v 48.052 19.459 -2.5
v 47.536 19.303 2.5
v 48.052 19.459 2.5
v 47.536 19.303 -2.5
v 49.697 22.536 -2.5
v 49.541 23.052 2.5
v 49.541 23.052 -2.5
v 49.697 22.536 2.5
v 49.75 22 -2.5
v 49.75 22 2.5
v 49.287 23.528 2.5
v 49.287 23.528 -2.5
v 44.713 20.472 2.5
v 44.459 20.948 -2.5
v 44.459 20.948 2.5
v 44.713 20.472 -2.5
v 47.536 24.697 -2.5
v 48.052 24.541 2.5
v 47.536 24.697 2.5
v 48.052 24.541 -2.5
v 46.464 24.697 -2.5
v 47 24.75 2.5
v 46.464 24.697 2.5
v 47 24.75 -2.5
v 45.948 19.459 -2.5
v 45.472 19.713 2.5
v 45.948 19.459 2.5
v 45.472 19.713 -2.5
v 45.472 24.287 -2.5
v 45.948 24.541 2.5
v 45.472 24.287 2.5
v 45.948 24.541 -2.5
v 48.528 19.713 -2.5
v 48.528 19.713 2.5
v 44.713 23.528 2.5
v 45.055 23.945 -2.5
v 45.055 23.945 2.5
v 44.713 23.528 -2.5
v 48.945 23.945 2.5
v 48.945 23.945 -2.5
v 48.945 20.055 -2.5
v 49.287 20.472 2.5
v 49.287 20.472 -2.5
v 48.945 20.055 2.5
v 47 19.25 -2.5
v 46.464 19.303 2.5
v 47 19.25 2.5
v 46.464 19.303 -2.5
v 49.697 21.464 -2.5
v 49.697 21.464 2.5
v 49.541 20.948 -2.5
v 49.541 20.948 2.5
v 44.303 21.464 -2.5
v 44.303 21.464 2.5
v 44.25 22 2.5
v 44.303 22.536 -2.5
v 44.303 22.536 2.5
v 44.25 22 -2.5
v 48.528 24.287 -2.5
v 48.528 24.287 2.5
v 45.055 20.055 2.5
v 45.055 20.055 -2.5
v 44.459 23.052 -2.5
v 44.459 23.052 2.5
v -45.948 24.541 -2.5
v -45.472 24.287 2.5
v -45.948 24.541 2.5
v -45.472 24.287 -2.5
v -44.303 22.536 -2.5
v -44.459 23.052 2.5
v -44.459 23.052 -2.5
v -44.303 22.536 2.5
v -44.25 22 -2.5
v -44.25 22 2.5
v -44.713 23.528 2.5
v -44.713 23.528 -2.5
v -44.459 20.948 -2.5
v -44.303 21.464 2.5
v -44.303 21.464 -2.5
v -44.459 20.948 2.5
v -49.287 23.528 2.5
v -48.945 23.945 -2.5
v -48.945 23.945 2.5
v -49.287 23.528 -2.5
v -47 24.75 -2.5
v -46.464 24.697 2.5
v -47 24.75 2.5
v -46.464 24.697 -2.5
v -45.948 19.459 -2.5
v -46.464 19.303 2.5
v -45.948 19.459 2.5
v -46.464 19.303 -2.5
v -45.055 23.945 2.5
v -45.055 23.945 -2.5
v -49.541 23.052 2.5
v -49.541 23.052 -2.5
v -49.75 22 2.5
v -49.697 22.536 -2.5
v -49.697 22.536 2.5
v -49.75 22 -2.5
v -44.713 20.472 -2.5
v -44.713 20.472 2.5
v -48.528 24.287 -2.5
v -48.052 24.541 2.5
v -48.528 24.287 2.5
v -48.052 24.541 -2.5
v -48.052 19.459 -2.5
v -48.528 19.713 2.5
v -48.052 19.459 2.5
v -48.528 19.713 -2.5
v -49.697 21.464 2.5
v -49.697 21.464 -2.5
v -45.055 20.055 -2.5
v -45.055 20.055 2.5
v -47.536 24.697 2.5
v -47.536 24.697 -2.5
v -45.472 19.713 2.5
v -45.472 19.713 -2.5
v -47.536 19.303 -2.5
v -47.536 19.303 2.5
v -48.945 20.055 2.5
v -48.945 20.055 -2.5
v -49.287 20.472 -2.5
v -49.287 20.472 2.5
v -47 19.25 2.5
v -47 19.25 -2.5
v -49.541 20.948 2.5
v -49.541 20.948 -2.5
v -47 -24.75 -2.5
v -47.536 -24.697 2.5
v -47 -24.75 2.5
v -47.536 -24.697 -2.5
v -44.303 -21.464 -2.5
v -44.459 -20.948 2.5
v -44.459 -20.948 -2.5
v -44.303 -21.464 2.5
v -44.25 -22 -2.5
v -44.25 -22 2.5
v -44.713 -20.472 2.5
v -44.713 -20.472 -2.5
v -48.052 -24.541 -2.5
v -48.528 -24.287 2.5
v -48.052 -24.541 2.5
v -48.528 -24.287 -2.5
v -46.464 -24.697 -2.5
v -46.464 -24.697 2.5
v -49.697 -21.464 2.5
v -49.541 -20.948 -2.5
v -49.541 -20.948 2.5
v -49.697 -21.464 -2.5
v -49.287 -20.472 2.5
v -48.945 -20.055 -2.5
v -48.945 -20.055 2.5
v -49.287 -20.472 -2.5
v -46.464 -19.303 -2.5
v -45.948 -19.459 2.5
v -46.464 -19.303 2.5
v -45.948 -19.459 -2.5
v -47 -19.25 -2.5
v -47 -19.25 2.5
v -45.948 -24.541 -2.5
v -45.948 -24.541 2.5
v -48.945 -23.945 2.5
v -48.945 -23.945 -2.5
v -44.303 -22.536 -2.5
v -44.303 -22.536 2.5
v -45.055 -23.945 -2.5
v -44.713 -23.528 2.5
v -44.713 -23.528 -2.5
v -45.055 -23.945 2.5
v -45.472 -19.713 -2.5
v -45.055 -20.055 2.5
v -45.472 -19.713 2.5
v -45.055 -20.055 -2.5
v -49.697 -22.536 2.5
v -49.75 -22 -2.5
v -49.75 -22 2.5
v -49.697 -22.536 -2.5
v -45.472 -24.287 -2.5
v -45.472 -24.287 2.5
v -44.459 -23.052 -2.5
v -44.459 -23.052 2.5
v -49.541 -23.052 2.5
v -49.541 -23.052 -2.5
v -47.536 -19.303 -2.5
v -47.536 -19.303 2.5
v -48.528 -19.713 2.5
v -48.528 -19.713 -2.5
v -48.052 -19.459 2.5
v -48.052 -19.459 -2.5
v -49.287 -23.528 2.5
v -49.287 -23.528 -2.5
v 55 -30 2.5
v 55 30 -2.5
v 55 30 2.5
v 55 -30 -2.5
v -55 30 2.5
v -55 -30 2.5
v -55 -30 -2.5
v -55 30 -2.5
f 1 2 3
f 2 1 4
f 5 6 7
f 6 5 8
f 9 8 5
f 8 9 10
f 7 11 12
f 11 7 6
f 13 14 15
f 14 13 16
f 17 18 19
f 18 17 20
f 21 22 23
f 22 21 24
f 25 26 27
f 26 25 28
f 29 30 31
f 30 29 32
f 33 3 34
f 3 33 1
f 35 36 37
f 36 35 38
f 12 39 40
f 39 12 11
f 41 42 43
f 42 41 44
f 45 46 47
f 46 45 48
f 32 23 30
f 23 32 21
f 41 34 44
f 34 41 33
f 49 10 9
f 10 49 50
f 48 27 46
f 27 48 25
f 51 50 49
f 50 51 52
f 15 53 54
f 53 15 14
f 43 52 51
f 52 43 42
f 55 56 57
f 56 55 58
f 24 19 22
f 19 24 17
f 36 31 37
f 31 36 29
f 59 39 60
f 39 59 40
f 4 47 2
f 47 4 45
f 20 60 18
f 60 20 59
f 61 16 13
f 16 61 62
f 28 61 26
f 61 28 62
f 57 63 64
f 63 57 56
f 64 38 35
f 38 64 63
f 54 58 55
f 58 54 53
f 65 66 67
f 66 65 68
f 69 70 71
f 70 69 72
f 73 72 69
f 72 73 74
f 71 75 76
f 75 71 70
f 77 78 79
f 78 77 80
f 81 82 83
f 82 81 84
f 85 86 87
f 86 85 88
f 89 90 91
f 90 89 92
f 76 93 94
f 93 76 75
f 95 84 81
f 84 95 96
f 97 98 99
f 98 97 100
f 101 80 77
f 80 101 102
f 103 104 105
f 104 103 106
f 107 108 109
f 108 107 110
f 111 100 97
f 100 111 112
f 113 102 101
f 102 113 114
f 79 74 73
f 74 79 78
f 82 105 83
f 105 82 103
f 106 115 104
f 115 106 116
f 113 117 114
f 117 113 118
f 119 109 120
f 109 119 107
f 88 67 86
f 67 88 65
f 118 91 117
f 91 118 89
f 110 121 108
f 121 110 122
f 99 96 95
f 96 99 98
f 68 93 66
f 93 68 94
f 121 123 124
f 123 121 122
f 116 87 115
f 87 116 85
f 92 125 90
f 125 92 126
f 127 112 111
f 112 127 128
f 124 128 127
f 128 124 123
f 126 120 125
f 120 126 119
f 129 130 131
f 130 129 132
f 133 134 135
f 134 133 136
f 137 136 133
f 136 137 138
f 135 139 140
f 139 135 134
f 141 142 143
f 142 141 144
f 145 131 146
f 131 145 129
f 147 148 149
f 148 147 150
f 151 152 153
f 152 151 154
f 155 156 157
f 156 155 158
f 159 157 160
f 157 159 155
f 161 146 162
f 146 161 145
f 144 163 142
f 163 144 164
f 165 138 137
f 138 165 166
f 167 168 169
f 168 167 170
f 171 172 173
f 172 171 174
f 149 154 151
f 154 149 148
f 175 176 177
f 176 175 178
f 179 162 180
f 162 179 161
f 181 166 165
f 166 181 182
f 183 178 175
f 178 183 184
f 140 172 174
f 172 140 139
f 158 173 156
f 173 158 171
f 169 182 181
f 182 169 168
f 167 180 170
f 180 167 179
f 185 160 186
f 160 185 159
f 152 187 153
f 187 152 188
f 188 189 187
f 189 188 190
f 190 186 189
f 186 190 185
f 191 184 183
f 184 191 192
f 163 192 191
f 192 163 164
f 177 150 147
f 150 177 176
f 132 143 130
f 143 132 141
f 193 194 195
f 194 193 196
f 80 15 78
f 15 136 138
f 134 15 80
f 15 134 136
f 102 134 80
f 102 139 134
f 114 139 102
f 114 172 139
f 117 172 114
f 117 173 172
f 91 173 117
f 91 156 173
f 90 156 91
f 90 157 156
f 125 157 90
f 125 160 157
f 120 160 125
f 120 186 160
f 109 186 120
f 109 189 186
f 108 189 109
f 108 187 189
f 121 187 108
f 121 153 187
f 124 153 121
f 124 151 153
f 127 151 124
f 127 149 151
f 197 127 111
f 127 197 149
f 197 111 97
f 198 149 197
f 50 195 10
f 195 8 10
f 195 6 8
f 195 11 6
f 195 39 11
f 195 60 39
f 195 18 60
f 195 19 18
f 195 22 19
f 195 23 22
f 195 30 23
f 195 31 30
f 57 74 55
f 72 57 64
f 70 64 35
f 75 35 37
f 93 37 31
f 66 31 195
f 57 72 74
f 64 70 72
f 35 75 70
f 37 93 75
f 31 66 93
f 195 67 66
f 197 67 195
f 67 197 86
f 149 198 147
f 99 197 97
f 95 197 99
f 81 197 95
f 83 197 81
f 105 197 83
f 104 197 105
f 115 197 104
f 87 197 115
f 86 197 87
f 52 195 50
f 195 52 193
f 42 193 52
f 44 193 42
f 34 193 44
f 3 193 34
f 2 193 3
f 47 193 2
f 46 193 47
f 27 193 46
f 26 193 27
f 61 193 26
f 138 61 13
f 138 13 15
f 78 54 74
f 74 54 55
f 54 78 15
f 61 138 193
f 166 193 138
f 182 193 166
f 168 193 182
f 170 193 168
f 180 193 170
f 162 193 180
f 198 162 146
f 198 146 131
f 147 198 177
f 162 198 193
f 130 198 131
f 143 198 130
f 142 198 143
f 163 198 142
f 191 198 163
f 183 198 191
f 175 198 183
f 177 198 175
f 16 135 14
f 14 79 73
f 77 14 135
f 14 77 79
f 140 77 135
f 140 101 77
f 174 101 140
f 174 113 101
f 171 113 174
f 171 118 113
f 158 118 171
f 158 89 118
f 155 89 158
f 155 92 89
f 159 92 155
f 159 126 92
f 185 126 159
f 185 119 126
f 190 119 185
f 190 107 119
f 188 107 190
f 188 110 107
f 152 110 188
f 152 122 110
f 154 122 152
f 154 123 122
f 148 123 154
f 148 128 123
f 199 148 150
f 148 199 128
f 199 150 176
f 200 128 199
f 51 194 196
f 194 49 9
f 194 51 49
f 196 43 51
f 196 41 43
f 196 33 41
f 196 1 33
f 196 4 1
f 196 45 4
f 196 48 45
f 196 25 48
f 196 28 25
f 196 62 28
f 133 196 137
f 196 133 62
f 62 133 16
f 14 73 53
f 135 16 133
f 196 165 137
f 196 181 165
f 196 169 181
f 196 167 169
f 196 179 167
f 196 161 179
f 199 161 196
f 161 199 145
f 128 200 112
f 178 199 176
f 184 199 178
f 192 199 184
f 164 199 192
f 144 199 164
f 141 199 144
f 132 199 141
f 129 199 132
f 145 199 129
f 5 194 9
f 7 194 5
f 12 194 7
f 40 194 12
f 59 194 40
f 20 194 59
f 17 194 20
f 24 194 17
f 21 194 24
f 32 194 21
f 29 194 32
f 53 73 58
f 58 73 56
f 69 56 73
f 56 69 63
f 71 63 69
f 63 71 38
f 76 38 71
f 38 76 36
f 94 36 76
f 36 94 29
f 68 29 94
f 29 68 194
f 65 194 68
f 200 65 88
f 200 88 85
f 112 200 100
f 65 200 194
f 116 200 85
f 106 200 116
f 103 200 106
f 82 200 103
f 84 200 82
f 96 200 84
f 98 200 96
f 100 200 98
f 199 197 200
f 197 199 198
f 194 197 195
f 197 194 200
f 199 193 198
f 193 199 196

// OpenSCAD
$fn = 32;

// ----------------------------------------------------------------------
// Corner plate 110 x 60 x 5
// 3 holes, centres taken from the edge offset
// ----------------------------------------------------------------------

// --- parameters (mm) ---
plate = [110, 60, 5];  // overall size (x, y, z)
holes = 3;             // number of holes the drawing asks for
hole_d = 5.5;          // hole diameter
edge = 8;              // hole centre offset from the plate edge

// --- derived feature positions (mm) ---
corner_x = plate[0] / 2 - edge;  // = 47   corner hole X
corner_y = plate[1] / 2 - edge;  // = 22   corner hole Y
feature_centers = [
  [corner_x, corner_y],
  [-corner_x, corner_y],
  [-corner_x, -corner_y]
];   // hole centres the loop below drills

// plate outline, every hole drilled through with the same cutters
difference() {
  cube(plate, center = true);
  for (centre = feature_centers)
    translate([centre[0], centre[1], 0])
      cylinder(d = hole_d, h = plate[2] + 2, center = true);
}
